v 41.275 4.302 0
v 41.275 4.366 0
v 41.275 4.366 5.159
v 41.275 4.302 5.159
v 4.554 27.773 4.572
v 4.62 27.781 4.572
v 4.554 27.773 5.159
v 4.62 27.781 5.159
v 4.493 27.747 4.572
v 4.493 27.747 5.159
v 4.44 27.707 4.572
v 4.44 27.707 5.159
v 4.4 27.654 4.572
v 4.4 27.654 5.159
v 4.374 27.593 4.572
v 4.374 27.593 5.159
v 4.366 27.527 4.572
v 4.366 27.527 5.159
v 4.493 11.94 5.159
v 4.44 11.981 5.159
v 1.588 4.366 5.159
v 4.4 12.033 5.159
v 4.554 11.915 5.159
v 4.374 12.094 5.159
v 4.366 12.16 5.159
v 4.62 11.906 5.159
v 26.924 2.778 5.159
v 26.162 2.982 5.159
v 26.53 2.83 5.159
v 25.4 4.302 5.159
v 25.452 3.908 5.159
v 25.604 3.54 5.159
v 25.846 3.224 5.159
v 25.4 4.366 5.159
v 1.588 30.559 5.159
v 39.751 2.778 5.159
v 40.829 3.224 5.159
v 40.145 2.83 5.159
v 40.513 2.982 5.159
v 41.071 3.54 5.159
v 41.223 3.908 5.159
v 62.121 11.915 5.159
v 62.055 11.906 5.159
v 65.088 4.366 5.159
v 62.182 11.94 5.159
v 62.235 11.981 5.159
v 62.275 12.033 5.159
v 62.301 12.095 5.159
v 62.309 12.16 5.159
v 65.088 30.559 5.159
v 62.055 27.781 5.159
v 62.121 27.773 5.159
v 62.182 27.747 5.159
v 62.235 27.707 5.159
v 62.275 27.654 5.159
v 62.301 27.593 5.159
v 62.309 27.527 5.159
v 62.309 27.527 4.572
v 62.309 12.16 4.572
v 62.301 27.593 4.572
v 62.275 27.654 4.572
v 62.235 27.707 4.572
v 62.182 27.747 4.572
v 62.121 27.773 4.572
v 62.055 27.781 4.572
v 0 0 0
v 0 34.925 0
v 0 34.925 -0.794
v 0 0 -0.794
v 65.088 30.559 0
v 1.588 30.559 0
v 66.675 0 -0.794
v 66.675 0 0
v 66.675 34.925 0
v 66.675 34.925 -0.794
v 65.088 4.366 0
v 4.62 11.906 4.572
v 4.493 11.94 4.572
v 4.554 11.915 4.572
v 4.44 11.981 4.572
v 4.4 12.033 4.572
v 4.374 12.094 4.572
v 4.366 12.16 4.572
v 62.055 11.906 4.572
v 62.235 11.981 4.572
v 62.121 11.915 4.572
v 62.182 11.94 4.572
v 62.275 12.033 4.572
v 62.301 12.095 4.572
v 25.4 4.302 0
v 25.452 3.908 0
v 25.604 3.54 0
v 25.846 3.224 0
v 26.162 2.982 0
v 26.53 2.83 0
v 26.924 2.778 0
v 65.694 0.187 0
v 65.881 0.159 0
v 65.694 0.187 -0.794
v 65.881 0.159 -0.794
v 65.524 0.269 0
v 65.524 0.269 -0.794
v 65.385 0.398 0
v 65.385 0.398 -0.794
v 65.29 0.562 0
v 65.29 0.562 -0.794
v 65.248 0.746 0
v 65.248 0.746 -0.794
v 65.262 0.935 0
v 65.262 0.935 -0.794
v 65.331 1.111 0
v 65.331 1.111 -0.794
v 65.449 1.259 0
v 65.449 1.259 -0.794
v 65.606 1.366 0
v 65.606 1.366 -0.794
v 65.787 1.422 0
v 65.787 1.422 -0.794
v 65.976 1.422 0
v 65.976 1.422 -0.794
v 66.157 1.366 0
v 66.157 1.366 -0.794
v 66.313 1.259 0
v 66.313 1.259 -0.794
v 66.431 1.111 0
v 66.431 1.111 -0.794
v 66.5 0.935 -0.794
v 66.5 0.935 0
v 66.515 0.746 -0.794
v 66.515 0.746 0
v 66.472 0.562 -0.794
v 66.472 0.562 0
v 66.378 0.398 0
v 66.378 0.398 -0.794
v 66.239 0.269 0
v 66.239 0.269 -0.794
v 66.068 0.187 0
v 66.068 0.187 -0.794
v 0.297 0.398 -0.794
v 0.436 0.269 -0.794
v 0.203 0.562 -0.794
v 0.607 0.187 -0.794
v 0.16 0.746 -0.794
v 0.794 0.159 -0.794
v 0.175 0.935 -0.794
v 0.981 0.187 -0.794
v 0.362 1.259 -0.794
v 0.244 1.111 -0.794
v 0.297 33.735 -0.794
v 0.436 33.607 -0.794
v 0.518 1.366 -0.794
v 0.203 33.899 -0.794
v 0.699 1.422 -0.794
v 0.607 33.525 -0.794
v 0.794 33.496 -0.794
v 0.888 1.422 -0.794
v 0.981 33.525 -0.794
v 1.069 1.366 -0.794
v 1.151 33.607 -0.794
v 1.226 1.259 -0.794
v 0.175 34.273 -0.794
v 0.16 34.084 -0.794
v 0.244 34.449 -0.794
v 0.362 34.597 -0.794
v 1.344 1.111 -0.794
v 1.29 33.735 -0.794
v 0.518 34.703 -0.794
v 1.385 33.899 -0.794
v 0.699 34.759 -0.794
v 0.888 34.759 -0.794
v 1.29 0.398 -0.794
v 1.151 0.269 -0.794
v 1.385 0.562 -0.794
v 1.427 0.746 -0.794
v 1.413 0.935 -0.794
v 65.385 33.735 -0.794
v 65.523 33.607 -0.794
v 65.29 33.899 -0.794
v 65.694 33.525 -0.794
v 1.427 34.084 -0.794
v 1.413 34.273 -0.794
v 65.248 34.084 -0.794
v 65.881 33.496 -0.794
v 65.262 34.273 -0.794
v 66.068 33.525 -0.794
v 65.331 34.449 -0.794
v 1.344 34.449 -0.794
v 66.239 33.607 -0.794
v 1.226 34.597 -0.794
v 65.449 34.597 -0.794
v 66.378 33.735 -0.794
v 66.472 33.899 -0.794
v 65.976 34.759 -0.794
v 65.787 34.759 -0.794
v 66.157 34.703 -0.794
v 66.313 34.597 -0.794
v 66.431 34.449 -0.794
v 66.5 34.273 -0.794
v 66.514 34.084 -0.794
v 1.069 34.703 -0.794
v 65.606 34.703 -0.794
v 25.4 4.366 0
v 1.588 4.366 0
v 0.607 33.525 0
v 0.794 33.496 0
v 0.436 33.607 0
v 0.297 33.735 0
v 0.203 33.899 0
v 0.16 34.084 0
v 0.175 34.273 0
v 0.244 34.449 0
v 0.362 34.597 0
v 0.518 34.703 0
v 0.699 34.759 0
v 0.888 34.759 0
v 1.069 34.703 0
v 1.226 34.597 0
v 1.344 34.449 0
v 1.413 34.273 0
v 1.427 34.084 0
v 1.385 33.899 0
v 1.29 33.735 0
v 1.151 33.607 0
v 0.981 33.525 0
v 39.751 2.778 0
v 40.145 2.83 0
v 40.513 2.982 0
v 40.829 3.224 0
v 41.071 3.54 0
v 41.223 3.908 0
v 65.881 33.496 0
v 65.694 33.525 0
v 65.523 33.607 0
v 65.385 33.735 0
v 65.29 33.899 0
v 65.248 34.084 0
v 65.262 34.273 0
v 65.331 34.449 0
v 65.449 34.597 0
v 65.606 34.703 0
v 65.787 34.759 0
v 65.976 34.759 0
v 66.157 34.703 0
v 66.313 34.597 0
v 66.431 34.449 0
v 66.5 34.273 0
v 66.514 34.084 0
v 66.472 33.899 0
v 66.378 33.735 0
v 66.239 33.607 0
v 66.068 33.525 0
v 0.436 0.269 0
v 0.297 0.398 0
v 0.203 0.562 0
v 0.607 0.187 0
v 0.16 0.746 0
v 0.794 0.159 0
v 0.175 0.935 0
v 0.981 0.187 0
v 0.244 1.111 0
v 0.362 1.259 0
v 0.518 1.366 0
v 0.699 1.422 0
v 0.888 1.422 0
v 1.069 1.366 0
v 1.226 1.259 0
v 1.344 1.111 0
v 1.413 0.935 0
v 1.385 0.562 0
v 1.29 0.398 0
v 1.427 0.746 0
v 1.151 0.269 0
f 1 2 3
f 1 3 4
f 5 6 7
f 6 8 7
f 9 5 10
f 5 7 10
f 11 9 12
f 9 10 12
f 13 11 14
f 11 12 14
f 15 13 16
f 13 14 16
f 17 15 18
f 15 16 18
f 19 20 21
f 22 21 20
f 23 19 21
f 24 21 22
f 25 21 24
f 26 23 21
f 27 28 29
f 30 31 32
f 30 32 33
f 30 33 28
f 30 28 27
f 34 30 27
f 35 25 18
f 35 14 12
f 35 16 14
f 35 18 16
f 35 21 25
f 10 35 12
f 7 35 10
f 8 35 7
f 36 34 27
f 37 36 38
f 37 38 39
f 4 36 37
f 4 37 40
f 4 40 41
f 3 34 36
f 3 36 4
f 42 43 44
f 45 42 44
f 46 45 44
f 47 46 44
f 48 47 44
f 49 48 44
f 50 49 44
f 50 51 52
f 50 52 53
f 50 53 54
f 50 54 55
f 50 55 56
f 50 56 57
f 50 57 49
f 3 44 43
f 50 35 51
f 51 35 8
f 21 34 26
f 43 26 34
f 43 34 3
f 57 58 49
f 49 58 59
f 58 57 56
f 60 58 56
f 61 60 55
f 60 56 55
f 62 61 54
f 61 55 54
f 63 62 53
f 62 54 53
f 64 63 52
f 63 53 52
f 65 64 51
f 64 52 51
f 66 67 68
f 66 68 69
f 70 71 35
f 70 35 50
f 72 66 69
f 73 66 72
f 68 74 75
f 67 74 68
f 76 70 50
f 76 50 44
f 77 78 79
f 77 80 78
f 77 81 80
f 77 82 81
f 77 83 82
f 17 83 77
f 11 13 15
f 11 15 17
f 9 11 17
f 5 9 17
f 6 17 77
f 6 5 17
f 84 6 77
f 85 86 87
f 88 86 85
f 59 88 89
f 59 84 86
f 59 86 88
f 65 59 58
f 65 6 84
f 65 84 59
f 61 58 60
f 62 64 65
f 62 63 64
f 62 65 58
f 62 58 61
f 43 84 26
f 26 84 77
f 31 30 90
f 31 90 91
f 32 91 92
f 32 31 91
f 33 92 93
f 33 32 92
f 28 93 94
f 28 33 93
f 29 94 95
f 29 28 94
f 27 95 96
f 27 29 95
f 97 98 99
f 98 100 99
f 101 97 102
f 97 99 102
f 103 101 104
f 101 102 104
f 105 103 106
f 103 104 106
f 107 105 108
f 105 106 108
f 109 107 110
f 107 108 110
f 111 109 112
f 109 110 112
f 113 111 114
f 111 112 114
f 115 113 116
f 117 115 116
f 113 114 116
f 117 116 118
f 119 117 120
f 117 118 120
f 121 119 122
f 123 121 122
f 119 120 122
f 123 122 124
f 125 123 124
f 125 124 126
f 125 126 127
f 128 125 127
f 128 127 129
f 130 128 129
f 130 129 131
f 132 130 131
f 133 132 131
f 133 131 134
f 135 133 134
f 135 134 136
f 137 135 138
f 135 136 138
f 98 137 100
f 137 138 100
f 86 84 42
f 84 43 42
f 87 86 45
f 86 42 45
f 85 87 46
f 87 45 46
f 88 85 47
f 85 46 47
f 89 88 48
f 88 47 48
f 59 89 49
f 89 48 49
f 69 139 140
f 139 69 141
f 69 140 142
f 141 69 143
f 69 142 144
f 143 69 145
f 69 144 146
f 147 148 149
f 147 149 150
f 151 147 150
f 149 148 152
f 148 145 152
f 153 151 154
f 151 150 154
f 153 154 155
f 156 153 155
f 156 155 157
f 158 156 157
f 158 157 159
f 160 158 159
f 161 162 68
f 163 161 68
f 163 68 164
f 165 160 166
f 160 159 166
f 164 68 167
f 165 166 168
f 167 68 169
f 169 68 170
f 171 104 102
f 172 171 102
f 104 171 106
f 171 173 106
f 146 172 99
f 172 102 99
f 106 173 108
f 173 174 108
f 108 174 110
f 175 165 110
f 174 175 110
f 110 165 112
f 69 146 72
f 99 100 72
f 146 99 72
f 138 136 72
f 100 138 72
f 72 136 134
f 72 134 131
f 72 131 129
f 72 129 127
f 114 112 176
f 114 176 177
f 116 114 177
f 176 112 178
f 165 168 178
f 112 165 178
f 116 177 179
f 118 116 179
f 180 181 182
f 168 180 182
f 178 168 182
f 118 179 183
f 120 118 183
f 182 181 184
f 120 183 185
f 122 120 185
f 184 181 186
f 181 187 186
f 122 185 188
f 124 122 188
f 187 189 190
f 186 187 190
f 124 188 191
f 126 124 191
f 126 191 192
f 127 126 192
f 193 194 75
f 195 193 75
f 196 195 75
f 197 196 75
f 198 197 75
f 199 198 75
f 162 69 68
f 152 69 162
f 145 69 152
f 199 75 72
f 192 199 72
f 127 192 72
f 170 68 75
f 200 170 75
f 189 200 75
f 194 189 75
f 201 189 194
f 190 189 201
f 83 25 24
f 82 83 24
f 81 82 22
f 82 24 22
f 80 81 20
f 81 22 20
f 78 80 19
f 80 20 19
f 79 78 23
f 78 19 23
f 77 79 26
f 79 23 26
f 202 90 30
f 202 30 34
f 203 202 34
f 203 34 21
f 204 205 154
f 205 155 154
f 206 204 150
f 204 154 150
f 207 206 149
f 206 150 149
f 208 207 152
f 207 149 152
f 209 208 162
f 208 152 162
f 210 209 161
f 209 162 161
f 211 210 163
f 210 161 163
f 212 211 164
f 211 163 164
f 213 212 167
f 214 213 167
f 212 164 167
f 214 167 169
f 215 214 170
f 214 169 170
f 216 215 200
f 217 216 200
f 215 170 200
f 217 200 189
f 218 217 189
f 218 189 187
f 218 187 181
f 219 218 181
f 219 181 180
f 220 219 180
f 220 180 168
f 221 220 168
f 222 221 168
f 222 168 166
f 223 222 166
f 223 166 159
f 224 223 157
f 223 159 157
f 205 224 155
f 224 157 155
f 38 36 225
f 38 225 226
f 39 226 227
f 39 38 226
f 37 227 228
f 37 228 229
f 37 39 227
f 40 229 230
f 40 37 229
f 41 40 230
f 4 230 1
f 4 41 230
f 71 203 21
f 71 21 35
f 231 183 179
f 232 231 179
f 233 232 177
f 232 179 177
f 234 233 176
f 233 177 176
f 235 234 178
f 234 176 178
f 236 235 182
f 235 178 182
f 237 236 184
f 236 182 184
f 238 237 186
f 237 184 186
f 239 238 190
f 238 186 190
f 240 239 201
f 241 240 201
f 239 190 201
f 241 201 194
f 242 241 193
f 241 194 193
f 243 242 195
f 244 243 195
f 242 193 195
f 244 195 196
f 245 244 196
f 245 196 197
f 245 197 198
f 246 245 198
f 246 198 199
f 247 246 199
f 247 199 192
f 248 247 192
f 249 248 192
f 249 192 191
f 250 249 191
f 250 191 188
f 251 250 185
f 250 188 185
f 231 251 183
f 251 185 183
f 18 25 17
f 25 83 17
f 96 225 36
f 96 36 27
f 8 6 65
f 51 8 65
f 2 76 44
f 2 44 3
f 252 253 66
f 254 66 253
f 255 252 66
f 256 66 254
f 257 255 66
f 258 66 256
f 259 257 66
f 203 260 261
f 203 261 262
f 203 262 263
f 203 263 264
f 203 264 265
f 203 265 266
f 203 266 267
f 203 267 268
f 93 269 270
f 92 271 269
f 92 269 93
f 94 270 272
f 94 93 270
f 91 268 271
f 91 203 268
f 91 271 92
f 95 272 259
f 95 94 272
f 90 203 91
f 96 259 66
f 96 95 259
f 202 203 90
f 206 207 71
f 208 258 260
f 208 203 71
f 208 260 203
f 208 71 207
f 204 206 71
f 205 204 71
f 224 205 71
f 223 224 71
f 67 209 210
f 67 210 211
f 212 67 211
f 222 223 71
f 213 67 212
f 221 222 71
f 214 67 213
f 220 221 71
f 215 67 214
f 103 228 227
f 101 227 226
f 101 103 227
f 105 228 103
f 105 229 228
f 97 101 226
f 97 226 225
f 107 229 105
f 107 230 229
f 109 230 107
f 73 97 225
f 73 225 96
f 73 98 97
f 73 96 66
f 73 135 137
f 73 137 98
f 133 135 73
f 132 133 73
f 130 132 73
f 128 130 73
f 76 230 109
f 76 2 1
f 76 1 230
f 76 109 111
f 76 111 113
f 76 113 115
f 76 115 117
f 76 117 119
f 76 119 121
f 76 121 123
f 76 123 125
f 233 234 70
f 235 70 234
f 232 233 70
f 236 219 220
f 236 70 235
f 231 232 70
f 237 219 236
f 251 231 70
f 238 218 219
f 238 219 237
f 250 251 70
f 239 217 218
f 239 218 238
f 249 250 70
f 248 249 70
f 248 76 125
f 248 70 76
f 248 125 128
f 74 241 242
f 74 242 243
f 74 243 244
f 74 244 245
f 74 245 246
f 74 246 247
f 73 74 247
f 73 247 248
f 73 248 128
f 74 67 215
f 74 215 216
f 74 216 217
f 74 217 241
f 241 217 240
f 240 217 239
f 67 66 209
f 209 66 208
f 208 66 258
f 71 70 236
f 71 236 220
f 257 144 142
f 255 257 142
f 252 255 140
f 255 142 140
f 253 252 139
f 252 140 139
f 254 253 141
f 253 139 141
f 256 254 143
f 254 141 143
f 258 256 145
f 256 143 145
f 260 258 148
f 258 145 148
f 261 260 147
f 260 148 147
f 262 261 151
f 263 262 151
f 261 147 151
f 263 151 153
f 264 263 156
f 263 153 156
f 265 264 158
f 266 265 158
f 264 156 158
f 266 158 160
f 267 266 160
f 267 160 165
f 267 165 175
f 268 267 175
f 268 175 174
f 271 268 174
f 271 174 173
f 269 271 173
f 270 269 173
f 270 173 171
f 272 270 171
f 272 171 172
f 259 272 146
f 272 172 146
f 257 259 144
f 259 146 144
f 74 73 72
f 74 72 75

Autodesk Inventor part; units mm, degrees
ref_plane "YZ Plane" through (0, 0, 0) normal (1, 0, 0) x (0, 1, 0)
ref_plane "XZ Plane" through (0, 0, 0) normal (0, 1, 0) x (-1, 0, 0)
ref_plane "XY Plane" through (0, 0, 0) normal (0, 0, 1) x (1, 0, 0)
sketch "TopProfile" plane through (0, 0, 0) normal (0, 0, 1) x (1, 0, 0)
  line L0 (0, 0) -> (66.675, 0)
  line L1 (66.675, 0) -> (66.675, 34.925)
  line L2 (66.675, 34.925) -> (0, 34.925)
  line L3 (0, 34.925) -> (0, 0)
  line L4 (1.5875, 30.5594) -> (65.0875, 30.5594)
  line L5 (65.0875, 30.5594) -> (65.0875, 4.3656)
  line L6 (65.0875, 4.3656) -> (1.5875, 4.3656)
  line L7 (1.5875, 4.3656) -> (1.5875, 30.5594)
  line L8 (25.4, 4.3656) -> (41.275, 4.3656)
  line L9 (41.275, 4.3656) -> (41.275, 2.7781)
  line L10 (41.275, 2.7781) -> (25.4, 2.7781)
  line L11 (25.4, 2.7781) -> (25.4, 4.3656)
  line L12 (4.3656, 27.7812) -> (62.3094, 27.7812)
  line L13 (62.3094, 27.7812) -> (62.3094, 11.9063)
  line L14 (62.3094, 11.9063) -> (4.3656, 11.9062)
  line L15 (4.3656, 11.9062) -> (4.3656, 27.7812)
  point P0 (33.3375, 4.3656)
  dimension "d0" = 66.675
  dimension "d1" = 34.925
  dimension "d2" = 26.1938
  dimension "d3" = 63.5
  dimension "d4" = 1.5875
  dimension "d5" = 1.6002
  dimension "d6" = 27.7812
  dimension "d7" = 15.875
  dimension "d8" = 4.3656
  dimension "d9" = 15.875
  dimension "d10" = 2.7781
  dimension "d11" = 2.7781
  dimension "d12" = 2.7781
extrude "BoardFeature" add sketch "TopProfile" against normal blind 0.7937 contours L3 L2 L1 L0 | L4 L5 L6 L7 | L6 L9 L10 L11 | L12 L13 L14 L15
extrude "ScreenFeature" add sketch "TopProfile" along normal blind 5.1594 contours L4 L5 L6 L7 | L6 L9 L10 L11
extrude "DisplayFeature" add sketch "TopProfile" along normal blind 4.572 contours L12 L13 L14 L15
fillet "BezelFilletsFeature" radius 0.254 4 edges at (4.3656, 27.7812, 4.8657) (62.3094, 27.7812, 4.8657) (62.3094, 11.9063, 4.8657) (4.3656, 11.9062, 4.8657)
fillet "BottomFilletsFeature" radius 1.524 2 edges at (25.4, 2.7781, 2.5797) (41.275, 2.7781, 2.5797)
sketch "MountHoles" plane through (0, 0, 0) normal (0, 0, 1) x (1, 0, 0)
  circle A0 centre (0.7937, 0.7937) radius 0.7937
  circle A1 centre (65.8813, 0.7937) radius 0.7937
  line L0 (0, 0) -> (66.675, 0) construction
  line L1 (0, 34.925) -> (0, 0) construction
  line L2 (66.675, 0) -> (66.675, 34.925) construction
  circle A2 centre (0.7937, 34.1313) radius 0.7937
  circle A3 centre (65.8812, 34.1313) radius 0.7937
  line L3 (66.675, 34.925) -> (0, 34.925) construction
  dimension "d21" = 1.5875
  dimension "d32" = 65.0875
hole "MountHolesFeature" at (0.7937, 0.7937, 0) at (0.7937, 34.1313, 0) at (65.8812, 34.1313, 0) at (65.8813, 0.7937, 0) direction (0, 0, -1) diameter 1.27 end through all
equation "\"d11\" = d10"
equation "\"d12\" = d10"
properties part number "oscilloscope-screen"
